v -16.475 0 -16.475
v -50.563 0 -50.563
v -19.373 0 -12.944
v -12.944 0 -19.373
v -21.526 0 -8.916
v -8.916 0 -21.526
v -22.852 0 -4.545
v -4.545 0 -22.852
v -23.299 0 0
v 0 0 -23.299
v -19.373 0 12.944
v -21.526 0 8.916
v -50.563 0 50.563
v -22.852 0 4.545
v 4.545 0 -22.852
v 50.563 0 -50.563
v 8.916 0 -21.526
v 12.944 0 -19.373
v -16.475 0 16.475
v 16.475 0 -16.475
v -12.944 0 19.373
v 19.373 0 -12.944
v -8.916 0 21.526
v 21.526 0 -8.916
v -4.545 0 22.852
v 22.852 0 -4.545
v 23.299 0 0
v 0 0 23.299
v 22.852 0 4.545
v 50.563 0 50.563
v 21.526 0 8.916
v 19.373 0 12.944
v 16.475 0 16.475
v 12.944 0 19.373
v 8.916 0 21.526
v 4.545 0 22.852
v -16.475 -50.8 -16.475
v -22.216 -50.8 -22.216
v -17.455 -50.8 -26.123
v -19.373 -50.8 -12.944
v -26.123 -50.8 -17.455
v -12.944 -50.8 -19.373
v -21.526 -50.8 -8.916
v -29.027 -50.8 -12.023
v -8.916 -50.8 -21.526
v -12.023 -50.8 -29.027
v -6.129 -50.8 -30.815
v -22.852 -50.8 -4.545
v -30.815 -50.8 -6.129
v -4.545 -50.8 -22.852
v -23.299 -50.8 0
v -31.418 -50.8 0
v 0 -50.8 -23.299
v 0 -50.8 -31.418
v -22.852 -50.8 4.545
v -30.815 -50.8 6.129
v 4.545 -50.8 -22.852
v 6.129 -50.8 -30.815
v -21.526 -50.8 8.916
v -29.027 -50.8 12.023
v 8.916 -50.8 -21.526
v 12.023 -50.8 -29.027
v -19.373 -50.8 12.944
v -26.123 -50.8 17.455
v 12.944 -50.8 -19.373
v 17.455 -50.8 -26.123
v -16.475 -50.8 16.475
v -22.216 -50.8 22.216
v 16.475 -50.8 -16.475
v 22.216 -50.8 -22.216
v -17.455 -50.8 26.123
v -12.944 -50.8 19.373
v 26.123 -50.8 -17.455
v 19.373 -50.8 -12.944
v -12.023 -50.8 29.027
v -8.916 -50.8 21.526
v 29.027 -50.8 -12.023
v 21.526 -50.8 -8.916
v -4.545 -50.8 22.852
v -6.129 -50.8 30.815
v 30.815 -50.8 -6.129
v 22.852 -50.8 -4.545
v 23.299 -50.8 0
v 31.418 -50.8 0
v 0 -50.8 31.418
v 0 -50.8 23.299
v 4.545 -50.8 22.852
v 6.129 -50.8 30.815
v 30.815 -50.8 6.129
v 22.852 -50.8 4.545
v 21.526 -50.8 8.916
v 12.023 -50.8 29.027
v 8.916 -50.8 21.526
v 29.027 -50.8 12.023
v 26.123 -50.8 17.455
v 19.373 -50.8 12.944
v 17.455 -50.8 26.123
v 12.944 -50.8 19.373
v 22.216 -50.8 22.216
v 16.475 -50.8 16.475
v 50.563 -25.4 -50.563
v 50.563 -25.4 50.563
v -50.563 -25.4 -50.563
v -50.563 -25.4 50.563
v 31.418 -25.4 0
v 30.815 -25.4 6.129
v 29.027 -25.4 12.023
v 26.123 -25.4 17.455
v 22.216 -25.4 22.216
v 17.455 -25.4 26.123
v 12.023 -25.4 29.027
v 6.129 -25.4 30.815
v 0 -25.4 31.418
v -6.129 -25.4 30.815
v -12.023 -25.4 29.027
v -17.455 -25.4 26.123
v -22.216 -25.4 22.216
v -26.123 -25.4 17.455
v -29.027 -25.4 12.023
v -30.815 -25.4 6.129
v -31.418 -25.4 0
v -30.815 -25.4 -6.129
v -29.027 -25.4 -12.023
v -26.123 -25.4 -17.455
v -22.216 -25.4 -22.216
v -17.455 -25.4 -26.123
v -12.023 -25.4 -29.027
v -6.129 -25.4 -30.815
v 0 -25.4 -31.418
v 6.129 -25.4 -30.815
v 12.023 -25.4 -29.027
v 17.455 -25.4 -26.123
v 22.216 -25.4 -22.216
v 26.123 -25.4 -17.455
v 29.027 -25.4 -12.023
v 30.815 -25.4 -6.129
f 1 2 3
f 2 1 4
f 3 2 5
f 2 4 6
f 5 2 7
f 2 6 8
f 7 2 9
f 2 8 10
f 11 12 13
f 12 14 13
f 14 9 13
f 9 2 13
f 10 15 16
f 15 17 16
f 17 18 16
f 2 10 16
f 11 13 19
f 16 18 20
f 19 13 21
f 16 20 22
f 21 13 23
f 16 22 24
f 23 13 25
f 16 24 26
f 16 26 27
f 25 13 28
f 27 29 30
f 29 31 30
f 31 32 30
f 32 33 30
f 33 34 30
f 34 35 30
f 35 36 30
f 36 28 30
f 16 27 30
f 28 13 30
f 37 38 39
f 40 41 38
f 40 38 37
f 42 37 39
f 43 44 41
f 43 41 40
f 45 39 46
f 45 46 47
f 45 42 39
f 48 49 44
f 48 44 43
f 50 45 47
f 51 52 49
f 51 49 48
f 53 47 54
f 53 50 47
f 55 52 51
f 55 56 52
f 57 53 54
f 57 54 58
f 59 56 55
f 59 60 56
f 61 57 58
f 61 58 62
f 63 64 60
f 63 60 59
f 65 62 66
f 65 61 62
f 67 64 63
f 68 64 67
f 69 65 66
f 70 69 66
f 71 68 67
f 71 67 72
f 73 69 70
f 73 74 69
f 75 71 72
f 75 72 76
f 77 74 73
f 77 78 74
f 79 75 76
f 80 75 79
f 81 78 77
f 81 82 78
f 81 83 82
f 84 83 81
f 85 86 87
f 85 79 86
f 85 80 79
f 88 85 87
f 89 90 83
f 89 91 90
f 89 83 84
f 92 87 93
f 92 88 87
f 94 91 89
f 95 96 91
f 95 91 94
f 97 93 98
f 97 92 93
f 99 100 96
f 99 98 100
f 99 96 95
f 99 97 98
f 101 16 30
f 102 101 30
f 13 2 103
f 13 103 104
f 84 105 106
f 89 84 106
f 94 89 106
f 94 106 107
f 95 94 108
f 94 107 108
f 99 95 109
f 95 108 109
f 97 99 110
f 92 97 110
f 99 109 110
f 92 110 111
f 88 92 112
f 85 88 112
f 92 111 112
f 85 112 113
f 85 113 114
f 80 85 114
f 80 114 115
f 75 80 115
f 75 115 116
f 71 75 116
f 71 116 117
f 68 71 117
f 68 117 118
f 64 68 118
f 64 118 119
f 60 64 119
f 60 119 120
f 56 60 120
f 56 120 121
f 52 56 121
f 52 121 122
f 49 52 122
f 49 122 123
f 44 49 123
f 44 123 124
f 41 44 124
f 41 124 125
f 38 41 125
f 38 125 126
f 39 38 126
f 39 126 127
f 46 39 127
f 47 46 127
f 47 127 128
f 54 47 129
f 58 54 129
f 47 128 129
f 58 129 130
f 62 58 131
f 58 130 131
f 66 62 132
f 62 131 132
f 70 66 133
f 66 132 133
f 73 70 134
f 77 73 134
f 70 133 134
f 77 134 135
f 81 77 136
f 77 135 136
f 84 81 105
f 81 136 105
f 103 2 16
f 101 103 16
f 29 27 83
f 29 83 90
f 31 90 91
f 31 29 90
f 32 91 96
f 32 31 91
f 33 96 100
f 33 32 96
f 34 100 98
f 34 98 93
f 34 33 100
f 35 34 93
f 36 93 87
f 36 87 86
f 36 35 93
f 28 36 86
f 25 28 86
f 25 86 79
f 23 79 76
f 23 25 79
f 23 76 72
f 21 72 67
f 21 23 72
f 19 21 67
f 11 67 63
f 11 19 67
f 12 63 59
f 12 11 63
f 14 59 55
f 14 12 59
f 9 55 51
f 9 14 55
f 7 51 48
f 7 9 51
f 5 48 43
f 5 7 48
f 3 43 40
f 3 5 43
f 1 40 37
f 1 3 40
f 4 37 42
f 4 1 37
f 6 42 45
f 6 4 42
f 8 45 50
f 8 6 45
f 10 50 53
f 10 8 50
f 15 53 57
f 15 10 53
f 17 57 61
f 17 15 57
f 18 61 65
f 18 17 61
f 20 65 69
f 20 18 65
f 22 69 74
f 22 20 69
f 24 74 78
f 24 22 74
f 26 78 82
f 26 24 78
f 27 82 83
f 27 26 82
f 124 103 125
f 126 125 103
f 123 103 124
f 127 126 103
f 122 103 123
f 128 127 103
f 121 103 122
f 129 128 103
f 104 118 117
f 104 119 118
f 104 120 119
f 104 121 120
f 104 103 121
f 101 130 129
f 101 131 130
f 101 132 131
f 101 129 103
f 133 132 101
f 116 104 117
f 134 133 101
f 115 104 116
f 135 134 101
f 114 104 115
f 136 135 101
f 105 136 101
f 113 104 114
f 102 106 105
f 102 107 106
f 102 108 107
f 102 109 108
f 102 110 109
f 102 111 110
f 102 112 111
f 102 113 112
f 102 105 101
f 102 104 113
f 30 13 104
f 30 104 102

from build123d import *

# Parameters (mm, degrees)
F0_W     = 101.125694
F0_H     = 101.125694
F0_R     = 31.418427
F1_DEPTH = 25.4
F0_R_2   = 23.299348
F2_DEPTH = 50.8


with BuildPart() as f1:
    # F0 (on Front) → F1 (new body)
    with BuildSketch(Plane.XZ):
        Rectangle(F0_W, F0_H)
        Circle(F0_R, mode=Mode.SUBTRACT)
    extrude(amount=F1_DEPTH)

    # F0 (on Front) → F2 (join)
    with BuildSketch(Plane.XZ):
        Circle(F0_R)
        Circle(F0_R_2, mode=Mode.SUBTRACT)
    extrude(amount=F2_DEPTH)


solid = f1.part
